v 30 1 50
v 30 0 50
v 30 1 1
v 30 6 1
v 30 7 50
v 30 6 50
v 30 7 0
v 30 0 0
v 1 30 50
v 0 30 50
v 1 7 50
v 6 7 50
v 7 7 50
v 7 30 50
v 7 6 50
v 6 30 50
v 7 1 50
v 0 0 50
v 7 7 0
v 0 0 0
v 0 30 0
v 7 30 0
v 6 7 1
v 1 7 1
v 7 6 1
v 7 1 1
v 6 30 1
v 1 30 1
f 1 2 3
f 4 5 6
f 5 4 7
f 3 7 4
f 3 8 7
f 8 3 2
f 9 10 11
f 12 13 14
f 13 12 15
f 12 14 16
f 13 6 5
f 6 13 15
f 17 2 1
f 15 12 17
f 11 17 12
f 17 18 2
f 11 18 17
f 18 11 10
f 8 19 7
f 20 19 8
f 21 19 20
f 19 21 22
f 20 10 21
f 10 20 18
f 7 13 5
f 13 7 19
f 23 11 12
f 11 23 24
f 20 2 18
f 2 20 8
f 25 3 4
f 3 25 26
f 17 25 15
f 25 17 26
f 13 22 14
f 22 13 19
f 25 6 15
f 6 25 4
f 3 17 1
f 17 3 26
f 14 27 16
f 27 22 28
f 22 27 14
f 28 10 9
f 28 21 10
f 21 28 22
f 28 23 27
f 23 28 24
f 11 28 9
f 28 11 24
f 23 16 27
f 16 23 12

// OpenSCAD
  difference() {
    cube([30,5+2,50]);
    translate([5+2,1,1]) cube([50,5,50]);
  }


color("red")
translate([5+2,0,0])
rotate([0,0,90])
    difference() {
      cube([30,5+2,50]);
      translate([5+2,1,1]) cube([50,5,50]);
    }
    
